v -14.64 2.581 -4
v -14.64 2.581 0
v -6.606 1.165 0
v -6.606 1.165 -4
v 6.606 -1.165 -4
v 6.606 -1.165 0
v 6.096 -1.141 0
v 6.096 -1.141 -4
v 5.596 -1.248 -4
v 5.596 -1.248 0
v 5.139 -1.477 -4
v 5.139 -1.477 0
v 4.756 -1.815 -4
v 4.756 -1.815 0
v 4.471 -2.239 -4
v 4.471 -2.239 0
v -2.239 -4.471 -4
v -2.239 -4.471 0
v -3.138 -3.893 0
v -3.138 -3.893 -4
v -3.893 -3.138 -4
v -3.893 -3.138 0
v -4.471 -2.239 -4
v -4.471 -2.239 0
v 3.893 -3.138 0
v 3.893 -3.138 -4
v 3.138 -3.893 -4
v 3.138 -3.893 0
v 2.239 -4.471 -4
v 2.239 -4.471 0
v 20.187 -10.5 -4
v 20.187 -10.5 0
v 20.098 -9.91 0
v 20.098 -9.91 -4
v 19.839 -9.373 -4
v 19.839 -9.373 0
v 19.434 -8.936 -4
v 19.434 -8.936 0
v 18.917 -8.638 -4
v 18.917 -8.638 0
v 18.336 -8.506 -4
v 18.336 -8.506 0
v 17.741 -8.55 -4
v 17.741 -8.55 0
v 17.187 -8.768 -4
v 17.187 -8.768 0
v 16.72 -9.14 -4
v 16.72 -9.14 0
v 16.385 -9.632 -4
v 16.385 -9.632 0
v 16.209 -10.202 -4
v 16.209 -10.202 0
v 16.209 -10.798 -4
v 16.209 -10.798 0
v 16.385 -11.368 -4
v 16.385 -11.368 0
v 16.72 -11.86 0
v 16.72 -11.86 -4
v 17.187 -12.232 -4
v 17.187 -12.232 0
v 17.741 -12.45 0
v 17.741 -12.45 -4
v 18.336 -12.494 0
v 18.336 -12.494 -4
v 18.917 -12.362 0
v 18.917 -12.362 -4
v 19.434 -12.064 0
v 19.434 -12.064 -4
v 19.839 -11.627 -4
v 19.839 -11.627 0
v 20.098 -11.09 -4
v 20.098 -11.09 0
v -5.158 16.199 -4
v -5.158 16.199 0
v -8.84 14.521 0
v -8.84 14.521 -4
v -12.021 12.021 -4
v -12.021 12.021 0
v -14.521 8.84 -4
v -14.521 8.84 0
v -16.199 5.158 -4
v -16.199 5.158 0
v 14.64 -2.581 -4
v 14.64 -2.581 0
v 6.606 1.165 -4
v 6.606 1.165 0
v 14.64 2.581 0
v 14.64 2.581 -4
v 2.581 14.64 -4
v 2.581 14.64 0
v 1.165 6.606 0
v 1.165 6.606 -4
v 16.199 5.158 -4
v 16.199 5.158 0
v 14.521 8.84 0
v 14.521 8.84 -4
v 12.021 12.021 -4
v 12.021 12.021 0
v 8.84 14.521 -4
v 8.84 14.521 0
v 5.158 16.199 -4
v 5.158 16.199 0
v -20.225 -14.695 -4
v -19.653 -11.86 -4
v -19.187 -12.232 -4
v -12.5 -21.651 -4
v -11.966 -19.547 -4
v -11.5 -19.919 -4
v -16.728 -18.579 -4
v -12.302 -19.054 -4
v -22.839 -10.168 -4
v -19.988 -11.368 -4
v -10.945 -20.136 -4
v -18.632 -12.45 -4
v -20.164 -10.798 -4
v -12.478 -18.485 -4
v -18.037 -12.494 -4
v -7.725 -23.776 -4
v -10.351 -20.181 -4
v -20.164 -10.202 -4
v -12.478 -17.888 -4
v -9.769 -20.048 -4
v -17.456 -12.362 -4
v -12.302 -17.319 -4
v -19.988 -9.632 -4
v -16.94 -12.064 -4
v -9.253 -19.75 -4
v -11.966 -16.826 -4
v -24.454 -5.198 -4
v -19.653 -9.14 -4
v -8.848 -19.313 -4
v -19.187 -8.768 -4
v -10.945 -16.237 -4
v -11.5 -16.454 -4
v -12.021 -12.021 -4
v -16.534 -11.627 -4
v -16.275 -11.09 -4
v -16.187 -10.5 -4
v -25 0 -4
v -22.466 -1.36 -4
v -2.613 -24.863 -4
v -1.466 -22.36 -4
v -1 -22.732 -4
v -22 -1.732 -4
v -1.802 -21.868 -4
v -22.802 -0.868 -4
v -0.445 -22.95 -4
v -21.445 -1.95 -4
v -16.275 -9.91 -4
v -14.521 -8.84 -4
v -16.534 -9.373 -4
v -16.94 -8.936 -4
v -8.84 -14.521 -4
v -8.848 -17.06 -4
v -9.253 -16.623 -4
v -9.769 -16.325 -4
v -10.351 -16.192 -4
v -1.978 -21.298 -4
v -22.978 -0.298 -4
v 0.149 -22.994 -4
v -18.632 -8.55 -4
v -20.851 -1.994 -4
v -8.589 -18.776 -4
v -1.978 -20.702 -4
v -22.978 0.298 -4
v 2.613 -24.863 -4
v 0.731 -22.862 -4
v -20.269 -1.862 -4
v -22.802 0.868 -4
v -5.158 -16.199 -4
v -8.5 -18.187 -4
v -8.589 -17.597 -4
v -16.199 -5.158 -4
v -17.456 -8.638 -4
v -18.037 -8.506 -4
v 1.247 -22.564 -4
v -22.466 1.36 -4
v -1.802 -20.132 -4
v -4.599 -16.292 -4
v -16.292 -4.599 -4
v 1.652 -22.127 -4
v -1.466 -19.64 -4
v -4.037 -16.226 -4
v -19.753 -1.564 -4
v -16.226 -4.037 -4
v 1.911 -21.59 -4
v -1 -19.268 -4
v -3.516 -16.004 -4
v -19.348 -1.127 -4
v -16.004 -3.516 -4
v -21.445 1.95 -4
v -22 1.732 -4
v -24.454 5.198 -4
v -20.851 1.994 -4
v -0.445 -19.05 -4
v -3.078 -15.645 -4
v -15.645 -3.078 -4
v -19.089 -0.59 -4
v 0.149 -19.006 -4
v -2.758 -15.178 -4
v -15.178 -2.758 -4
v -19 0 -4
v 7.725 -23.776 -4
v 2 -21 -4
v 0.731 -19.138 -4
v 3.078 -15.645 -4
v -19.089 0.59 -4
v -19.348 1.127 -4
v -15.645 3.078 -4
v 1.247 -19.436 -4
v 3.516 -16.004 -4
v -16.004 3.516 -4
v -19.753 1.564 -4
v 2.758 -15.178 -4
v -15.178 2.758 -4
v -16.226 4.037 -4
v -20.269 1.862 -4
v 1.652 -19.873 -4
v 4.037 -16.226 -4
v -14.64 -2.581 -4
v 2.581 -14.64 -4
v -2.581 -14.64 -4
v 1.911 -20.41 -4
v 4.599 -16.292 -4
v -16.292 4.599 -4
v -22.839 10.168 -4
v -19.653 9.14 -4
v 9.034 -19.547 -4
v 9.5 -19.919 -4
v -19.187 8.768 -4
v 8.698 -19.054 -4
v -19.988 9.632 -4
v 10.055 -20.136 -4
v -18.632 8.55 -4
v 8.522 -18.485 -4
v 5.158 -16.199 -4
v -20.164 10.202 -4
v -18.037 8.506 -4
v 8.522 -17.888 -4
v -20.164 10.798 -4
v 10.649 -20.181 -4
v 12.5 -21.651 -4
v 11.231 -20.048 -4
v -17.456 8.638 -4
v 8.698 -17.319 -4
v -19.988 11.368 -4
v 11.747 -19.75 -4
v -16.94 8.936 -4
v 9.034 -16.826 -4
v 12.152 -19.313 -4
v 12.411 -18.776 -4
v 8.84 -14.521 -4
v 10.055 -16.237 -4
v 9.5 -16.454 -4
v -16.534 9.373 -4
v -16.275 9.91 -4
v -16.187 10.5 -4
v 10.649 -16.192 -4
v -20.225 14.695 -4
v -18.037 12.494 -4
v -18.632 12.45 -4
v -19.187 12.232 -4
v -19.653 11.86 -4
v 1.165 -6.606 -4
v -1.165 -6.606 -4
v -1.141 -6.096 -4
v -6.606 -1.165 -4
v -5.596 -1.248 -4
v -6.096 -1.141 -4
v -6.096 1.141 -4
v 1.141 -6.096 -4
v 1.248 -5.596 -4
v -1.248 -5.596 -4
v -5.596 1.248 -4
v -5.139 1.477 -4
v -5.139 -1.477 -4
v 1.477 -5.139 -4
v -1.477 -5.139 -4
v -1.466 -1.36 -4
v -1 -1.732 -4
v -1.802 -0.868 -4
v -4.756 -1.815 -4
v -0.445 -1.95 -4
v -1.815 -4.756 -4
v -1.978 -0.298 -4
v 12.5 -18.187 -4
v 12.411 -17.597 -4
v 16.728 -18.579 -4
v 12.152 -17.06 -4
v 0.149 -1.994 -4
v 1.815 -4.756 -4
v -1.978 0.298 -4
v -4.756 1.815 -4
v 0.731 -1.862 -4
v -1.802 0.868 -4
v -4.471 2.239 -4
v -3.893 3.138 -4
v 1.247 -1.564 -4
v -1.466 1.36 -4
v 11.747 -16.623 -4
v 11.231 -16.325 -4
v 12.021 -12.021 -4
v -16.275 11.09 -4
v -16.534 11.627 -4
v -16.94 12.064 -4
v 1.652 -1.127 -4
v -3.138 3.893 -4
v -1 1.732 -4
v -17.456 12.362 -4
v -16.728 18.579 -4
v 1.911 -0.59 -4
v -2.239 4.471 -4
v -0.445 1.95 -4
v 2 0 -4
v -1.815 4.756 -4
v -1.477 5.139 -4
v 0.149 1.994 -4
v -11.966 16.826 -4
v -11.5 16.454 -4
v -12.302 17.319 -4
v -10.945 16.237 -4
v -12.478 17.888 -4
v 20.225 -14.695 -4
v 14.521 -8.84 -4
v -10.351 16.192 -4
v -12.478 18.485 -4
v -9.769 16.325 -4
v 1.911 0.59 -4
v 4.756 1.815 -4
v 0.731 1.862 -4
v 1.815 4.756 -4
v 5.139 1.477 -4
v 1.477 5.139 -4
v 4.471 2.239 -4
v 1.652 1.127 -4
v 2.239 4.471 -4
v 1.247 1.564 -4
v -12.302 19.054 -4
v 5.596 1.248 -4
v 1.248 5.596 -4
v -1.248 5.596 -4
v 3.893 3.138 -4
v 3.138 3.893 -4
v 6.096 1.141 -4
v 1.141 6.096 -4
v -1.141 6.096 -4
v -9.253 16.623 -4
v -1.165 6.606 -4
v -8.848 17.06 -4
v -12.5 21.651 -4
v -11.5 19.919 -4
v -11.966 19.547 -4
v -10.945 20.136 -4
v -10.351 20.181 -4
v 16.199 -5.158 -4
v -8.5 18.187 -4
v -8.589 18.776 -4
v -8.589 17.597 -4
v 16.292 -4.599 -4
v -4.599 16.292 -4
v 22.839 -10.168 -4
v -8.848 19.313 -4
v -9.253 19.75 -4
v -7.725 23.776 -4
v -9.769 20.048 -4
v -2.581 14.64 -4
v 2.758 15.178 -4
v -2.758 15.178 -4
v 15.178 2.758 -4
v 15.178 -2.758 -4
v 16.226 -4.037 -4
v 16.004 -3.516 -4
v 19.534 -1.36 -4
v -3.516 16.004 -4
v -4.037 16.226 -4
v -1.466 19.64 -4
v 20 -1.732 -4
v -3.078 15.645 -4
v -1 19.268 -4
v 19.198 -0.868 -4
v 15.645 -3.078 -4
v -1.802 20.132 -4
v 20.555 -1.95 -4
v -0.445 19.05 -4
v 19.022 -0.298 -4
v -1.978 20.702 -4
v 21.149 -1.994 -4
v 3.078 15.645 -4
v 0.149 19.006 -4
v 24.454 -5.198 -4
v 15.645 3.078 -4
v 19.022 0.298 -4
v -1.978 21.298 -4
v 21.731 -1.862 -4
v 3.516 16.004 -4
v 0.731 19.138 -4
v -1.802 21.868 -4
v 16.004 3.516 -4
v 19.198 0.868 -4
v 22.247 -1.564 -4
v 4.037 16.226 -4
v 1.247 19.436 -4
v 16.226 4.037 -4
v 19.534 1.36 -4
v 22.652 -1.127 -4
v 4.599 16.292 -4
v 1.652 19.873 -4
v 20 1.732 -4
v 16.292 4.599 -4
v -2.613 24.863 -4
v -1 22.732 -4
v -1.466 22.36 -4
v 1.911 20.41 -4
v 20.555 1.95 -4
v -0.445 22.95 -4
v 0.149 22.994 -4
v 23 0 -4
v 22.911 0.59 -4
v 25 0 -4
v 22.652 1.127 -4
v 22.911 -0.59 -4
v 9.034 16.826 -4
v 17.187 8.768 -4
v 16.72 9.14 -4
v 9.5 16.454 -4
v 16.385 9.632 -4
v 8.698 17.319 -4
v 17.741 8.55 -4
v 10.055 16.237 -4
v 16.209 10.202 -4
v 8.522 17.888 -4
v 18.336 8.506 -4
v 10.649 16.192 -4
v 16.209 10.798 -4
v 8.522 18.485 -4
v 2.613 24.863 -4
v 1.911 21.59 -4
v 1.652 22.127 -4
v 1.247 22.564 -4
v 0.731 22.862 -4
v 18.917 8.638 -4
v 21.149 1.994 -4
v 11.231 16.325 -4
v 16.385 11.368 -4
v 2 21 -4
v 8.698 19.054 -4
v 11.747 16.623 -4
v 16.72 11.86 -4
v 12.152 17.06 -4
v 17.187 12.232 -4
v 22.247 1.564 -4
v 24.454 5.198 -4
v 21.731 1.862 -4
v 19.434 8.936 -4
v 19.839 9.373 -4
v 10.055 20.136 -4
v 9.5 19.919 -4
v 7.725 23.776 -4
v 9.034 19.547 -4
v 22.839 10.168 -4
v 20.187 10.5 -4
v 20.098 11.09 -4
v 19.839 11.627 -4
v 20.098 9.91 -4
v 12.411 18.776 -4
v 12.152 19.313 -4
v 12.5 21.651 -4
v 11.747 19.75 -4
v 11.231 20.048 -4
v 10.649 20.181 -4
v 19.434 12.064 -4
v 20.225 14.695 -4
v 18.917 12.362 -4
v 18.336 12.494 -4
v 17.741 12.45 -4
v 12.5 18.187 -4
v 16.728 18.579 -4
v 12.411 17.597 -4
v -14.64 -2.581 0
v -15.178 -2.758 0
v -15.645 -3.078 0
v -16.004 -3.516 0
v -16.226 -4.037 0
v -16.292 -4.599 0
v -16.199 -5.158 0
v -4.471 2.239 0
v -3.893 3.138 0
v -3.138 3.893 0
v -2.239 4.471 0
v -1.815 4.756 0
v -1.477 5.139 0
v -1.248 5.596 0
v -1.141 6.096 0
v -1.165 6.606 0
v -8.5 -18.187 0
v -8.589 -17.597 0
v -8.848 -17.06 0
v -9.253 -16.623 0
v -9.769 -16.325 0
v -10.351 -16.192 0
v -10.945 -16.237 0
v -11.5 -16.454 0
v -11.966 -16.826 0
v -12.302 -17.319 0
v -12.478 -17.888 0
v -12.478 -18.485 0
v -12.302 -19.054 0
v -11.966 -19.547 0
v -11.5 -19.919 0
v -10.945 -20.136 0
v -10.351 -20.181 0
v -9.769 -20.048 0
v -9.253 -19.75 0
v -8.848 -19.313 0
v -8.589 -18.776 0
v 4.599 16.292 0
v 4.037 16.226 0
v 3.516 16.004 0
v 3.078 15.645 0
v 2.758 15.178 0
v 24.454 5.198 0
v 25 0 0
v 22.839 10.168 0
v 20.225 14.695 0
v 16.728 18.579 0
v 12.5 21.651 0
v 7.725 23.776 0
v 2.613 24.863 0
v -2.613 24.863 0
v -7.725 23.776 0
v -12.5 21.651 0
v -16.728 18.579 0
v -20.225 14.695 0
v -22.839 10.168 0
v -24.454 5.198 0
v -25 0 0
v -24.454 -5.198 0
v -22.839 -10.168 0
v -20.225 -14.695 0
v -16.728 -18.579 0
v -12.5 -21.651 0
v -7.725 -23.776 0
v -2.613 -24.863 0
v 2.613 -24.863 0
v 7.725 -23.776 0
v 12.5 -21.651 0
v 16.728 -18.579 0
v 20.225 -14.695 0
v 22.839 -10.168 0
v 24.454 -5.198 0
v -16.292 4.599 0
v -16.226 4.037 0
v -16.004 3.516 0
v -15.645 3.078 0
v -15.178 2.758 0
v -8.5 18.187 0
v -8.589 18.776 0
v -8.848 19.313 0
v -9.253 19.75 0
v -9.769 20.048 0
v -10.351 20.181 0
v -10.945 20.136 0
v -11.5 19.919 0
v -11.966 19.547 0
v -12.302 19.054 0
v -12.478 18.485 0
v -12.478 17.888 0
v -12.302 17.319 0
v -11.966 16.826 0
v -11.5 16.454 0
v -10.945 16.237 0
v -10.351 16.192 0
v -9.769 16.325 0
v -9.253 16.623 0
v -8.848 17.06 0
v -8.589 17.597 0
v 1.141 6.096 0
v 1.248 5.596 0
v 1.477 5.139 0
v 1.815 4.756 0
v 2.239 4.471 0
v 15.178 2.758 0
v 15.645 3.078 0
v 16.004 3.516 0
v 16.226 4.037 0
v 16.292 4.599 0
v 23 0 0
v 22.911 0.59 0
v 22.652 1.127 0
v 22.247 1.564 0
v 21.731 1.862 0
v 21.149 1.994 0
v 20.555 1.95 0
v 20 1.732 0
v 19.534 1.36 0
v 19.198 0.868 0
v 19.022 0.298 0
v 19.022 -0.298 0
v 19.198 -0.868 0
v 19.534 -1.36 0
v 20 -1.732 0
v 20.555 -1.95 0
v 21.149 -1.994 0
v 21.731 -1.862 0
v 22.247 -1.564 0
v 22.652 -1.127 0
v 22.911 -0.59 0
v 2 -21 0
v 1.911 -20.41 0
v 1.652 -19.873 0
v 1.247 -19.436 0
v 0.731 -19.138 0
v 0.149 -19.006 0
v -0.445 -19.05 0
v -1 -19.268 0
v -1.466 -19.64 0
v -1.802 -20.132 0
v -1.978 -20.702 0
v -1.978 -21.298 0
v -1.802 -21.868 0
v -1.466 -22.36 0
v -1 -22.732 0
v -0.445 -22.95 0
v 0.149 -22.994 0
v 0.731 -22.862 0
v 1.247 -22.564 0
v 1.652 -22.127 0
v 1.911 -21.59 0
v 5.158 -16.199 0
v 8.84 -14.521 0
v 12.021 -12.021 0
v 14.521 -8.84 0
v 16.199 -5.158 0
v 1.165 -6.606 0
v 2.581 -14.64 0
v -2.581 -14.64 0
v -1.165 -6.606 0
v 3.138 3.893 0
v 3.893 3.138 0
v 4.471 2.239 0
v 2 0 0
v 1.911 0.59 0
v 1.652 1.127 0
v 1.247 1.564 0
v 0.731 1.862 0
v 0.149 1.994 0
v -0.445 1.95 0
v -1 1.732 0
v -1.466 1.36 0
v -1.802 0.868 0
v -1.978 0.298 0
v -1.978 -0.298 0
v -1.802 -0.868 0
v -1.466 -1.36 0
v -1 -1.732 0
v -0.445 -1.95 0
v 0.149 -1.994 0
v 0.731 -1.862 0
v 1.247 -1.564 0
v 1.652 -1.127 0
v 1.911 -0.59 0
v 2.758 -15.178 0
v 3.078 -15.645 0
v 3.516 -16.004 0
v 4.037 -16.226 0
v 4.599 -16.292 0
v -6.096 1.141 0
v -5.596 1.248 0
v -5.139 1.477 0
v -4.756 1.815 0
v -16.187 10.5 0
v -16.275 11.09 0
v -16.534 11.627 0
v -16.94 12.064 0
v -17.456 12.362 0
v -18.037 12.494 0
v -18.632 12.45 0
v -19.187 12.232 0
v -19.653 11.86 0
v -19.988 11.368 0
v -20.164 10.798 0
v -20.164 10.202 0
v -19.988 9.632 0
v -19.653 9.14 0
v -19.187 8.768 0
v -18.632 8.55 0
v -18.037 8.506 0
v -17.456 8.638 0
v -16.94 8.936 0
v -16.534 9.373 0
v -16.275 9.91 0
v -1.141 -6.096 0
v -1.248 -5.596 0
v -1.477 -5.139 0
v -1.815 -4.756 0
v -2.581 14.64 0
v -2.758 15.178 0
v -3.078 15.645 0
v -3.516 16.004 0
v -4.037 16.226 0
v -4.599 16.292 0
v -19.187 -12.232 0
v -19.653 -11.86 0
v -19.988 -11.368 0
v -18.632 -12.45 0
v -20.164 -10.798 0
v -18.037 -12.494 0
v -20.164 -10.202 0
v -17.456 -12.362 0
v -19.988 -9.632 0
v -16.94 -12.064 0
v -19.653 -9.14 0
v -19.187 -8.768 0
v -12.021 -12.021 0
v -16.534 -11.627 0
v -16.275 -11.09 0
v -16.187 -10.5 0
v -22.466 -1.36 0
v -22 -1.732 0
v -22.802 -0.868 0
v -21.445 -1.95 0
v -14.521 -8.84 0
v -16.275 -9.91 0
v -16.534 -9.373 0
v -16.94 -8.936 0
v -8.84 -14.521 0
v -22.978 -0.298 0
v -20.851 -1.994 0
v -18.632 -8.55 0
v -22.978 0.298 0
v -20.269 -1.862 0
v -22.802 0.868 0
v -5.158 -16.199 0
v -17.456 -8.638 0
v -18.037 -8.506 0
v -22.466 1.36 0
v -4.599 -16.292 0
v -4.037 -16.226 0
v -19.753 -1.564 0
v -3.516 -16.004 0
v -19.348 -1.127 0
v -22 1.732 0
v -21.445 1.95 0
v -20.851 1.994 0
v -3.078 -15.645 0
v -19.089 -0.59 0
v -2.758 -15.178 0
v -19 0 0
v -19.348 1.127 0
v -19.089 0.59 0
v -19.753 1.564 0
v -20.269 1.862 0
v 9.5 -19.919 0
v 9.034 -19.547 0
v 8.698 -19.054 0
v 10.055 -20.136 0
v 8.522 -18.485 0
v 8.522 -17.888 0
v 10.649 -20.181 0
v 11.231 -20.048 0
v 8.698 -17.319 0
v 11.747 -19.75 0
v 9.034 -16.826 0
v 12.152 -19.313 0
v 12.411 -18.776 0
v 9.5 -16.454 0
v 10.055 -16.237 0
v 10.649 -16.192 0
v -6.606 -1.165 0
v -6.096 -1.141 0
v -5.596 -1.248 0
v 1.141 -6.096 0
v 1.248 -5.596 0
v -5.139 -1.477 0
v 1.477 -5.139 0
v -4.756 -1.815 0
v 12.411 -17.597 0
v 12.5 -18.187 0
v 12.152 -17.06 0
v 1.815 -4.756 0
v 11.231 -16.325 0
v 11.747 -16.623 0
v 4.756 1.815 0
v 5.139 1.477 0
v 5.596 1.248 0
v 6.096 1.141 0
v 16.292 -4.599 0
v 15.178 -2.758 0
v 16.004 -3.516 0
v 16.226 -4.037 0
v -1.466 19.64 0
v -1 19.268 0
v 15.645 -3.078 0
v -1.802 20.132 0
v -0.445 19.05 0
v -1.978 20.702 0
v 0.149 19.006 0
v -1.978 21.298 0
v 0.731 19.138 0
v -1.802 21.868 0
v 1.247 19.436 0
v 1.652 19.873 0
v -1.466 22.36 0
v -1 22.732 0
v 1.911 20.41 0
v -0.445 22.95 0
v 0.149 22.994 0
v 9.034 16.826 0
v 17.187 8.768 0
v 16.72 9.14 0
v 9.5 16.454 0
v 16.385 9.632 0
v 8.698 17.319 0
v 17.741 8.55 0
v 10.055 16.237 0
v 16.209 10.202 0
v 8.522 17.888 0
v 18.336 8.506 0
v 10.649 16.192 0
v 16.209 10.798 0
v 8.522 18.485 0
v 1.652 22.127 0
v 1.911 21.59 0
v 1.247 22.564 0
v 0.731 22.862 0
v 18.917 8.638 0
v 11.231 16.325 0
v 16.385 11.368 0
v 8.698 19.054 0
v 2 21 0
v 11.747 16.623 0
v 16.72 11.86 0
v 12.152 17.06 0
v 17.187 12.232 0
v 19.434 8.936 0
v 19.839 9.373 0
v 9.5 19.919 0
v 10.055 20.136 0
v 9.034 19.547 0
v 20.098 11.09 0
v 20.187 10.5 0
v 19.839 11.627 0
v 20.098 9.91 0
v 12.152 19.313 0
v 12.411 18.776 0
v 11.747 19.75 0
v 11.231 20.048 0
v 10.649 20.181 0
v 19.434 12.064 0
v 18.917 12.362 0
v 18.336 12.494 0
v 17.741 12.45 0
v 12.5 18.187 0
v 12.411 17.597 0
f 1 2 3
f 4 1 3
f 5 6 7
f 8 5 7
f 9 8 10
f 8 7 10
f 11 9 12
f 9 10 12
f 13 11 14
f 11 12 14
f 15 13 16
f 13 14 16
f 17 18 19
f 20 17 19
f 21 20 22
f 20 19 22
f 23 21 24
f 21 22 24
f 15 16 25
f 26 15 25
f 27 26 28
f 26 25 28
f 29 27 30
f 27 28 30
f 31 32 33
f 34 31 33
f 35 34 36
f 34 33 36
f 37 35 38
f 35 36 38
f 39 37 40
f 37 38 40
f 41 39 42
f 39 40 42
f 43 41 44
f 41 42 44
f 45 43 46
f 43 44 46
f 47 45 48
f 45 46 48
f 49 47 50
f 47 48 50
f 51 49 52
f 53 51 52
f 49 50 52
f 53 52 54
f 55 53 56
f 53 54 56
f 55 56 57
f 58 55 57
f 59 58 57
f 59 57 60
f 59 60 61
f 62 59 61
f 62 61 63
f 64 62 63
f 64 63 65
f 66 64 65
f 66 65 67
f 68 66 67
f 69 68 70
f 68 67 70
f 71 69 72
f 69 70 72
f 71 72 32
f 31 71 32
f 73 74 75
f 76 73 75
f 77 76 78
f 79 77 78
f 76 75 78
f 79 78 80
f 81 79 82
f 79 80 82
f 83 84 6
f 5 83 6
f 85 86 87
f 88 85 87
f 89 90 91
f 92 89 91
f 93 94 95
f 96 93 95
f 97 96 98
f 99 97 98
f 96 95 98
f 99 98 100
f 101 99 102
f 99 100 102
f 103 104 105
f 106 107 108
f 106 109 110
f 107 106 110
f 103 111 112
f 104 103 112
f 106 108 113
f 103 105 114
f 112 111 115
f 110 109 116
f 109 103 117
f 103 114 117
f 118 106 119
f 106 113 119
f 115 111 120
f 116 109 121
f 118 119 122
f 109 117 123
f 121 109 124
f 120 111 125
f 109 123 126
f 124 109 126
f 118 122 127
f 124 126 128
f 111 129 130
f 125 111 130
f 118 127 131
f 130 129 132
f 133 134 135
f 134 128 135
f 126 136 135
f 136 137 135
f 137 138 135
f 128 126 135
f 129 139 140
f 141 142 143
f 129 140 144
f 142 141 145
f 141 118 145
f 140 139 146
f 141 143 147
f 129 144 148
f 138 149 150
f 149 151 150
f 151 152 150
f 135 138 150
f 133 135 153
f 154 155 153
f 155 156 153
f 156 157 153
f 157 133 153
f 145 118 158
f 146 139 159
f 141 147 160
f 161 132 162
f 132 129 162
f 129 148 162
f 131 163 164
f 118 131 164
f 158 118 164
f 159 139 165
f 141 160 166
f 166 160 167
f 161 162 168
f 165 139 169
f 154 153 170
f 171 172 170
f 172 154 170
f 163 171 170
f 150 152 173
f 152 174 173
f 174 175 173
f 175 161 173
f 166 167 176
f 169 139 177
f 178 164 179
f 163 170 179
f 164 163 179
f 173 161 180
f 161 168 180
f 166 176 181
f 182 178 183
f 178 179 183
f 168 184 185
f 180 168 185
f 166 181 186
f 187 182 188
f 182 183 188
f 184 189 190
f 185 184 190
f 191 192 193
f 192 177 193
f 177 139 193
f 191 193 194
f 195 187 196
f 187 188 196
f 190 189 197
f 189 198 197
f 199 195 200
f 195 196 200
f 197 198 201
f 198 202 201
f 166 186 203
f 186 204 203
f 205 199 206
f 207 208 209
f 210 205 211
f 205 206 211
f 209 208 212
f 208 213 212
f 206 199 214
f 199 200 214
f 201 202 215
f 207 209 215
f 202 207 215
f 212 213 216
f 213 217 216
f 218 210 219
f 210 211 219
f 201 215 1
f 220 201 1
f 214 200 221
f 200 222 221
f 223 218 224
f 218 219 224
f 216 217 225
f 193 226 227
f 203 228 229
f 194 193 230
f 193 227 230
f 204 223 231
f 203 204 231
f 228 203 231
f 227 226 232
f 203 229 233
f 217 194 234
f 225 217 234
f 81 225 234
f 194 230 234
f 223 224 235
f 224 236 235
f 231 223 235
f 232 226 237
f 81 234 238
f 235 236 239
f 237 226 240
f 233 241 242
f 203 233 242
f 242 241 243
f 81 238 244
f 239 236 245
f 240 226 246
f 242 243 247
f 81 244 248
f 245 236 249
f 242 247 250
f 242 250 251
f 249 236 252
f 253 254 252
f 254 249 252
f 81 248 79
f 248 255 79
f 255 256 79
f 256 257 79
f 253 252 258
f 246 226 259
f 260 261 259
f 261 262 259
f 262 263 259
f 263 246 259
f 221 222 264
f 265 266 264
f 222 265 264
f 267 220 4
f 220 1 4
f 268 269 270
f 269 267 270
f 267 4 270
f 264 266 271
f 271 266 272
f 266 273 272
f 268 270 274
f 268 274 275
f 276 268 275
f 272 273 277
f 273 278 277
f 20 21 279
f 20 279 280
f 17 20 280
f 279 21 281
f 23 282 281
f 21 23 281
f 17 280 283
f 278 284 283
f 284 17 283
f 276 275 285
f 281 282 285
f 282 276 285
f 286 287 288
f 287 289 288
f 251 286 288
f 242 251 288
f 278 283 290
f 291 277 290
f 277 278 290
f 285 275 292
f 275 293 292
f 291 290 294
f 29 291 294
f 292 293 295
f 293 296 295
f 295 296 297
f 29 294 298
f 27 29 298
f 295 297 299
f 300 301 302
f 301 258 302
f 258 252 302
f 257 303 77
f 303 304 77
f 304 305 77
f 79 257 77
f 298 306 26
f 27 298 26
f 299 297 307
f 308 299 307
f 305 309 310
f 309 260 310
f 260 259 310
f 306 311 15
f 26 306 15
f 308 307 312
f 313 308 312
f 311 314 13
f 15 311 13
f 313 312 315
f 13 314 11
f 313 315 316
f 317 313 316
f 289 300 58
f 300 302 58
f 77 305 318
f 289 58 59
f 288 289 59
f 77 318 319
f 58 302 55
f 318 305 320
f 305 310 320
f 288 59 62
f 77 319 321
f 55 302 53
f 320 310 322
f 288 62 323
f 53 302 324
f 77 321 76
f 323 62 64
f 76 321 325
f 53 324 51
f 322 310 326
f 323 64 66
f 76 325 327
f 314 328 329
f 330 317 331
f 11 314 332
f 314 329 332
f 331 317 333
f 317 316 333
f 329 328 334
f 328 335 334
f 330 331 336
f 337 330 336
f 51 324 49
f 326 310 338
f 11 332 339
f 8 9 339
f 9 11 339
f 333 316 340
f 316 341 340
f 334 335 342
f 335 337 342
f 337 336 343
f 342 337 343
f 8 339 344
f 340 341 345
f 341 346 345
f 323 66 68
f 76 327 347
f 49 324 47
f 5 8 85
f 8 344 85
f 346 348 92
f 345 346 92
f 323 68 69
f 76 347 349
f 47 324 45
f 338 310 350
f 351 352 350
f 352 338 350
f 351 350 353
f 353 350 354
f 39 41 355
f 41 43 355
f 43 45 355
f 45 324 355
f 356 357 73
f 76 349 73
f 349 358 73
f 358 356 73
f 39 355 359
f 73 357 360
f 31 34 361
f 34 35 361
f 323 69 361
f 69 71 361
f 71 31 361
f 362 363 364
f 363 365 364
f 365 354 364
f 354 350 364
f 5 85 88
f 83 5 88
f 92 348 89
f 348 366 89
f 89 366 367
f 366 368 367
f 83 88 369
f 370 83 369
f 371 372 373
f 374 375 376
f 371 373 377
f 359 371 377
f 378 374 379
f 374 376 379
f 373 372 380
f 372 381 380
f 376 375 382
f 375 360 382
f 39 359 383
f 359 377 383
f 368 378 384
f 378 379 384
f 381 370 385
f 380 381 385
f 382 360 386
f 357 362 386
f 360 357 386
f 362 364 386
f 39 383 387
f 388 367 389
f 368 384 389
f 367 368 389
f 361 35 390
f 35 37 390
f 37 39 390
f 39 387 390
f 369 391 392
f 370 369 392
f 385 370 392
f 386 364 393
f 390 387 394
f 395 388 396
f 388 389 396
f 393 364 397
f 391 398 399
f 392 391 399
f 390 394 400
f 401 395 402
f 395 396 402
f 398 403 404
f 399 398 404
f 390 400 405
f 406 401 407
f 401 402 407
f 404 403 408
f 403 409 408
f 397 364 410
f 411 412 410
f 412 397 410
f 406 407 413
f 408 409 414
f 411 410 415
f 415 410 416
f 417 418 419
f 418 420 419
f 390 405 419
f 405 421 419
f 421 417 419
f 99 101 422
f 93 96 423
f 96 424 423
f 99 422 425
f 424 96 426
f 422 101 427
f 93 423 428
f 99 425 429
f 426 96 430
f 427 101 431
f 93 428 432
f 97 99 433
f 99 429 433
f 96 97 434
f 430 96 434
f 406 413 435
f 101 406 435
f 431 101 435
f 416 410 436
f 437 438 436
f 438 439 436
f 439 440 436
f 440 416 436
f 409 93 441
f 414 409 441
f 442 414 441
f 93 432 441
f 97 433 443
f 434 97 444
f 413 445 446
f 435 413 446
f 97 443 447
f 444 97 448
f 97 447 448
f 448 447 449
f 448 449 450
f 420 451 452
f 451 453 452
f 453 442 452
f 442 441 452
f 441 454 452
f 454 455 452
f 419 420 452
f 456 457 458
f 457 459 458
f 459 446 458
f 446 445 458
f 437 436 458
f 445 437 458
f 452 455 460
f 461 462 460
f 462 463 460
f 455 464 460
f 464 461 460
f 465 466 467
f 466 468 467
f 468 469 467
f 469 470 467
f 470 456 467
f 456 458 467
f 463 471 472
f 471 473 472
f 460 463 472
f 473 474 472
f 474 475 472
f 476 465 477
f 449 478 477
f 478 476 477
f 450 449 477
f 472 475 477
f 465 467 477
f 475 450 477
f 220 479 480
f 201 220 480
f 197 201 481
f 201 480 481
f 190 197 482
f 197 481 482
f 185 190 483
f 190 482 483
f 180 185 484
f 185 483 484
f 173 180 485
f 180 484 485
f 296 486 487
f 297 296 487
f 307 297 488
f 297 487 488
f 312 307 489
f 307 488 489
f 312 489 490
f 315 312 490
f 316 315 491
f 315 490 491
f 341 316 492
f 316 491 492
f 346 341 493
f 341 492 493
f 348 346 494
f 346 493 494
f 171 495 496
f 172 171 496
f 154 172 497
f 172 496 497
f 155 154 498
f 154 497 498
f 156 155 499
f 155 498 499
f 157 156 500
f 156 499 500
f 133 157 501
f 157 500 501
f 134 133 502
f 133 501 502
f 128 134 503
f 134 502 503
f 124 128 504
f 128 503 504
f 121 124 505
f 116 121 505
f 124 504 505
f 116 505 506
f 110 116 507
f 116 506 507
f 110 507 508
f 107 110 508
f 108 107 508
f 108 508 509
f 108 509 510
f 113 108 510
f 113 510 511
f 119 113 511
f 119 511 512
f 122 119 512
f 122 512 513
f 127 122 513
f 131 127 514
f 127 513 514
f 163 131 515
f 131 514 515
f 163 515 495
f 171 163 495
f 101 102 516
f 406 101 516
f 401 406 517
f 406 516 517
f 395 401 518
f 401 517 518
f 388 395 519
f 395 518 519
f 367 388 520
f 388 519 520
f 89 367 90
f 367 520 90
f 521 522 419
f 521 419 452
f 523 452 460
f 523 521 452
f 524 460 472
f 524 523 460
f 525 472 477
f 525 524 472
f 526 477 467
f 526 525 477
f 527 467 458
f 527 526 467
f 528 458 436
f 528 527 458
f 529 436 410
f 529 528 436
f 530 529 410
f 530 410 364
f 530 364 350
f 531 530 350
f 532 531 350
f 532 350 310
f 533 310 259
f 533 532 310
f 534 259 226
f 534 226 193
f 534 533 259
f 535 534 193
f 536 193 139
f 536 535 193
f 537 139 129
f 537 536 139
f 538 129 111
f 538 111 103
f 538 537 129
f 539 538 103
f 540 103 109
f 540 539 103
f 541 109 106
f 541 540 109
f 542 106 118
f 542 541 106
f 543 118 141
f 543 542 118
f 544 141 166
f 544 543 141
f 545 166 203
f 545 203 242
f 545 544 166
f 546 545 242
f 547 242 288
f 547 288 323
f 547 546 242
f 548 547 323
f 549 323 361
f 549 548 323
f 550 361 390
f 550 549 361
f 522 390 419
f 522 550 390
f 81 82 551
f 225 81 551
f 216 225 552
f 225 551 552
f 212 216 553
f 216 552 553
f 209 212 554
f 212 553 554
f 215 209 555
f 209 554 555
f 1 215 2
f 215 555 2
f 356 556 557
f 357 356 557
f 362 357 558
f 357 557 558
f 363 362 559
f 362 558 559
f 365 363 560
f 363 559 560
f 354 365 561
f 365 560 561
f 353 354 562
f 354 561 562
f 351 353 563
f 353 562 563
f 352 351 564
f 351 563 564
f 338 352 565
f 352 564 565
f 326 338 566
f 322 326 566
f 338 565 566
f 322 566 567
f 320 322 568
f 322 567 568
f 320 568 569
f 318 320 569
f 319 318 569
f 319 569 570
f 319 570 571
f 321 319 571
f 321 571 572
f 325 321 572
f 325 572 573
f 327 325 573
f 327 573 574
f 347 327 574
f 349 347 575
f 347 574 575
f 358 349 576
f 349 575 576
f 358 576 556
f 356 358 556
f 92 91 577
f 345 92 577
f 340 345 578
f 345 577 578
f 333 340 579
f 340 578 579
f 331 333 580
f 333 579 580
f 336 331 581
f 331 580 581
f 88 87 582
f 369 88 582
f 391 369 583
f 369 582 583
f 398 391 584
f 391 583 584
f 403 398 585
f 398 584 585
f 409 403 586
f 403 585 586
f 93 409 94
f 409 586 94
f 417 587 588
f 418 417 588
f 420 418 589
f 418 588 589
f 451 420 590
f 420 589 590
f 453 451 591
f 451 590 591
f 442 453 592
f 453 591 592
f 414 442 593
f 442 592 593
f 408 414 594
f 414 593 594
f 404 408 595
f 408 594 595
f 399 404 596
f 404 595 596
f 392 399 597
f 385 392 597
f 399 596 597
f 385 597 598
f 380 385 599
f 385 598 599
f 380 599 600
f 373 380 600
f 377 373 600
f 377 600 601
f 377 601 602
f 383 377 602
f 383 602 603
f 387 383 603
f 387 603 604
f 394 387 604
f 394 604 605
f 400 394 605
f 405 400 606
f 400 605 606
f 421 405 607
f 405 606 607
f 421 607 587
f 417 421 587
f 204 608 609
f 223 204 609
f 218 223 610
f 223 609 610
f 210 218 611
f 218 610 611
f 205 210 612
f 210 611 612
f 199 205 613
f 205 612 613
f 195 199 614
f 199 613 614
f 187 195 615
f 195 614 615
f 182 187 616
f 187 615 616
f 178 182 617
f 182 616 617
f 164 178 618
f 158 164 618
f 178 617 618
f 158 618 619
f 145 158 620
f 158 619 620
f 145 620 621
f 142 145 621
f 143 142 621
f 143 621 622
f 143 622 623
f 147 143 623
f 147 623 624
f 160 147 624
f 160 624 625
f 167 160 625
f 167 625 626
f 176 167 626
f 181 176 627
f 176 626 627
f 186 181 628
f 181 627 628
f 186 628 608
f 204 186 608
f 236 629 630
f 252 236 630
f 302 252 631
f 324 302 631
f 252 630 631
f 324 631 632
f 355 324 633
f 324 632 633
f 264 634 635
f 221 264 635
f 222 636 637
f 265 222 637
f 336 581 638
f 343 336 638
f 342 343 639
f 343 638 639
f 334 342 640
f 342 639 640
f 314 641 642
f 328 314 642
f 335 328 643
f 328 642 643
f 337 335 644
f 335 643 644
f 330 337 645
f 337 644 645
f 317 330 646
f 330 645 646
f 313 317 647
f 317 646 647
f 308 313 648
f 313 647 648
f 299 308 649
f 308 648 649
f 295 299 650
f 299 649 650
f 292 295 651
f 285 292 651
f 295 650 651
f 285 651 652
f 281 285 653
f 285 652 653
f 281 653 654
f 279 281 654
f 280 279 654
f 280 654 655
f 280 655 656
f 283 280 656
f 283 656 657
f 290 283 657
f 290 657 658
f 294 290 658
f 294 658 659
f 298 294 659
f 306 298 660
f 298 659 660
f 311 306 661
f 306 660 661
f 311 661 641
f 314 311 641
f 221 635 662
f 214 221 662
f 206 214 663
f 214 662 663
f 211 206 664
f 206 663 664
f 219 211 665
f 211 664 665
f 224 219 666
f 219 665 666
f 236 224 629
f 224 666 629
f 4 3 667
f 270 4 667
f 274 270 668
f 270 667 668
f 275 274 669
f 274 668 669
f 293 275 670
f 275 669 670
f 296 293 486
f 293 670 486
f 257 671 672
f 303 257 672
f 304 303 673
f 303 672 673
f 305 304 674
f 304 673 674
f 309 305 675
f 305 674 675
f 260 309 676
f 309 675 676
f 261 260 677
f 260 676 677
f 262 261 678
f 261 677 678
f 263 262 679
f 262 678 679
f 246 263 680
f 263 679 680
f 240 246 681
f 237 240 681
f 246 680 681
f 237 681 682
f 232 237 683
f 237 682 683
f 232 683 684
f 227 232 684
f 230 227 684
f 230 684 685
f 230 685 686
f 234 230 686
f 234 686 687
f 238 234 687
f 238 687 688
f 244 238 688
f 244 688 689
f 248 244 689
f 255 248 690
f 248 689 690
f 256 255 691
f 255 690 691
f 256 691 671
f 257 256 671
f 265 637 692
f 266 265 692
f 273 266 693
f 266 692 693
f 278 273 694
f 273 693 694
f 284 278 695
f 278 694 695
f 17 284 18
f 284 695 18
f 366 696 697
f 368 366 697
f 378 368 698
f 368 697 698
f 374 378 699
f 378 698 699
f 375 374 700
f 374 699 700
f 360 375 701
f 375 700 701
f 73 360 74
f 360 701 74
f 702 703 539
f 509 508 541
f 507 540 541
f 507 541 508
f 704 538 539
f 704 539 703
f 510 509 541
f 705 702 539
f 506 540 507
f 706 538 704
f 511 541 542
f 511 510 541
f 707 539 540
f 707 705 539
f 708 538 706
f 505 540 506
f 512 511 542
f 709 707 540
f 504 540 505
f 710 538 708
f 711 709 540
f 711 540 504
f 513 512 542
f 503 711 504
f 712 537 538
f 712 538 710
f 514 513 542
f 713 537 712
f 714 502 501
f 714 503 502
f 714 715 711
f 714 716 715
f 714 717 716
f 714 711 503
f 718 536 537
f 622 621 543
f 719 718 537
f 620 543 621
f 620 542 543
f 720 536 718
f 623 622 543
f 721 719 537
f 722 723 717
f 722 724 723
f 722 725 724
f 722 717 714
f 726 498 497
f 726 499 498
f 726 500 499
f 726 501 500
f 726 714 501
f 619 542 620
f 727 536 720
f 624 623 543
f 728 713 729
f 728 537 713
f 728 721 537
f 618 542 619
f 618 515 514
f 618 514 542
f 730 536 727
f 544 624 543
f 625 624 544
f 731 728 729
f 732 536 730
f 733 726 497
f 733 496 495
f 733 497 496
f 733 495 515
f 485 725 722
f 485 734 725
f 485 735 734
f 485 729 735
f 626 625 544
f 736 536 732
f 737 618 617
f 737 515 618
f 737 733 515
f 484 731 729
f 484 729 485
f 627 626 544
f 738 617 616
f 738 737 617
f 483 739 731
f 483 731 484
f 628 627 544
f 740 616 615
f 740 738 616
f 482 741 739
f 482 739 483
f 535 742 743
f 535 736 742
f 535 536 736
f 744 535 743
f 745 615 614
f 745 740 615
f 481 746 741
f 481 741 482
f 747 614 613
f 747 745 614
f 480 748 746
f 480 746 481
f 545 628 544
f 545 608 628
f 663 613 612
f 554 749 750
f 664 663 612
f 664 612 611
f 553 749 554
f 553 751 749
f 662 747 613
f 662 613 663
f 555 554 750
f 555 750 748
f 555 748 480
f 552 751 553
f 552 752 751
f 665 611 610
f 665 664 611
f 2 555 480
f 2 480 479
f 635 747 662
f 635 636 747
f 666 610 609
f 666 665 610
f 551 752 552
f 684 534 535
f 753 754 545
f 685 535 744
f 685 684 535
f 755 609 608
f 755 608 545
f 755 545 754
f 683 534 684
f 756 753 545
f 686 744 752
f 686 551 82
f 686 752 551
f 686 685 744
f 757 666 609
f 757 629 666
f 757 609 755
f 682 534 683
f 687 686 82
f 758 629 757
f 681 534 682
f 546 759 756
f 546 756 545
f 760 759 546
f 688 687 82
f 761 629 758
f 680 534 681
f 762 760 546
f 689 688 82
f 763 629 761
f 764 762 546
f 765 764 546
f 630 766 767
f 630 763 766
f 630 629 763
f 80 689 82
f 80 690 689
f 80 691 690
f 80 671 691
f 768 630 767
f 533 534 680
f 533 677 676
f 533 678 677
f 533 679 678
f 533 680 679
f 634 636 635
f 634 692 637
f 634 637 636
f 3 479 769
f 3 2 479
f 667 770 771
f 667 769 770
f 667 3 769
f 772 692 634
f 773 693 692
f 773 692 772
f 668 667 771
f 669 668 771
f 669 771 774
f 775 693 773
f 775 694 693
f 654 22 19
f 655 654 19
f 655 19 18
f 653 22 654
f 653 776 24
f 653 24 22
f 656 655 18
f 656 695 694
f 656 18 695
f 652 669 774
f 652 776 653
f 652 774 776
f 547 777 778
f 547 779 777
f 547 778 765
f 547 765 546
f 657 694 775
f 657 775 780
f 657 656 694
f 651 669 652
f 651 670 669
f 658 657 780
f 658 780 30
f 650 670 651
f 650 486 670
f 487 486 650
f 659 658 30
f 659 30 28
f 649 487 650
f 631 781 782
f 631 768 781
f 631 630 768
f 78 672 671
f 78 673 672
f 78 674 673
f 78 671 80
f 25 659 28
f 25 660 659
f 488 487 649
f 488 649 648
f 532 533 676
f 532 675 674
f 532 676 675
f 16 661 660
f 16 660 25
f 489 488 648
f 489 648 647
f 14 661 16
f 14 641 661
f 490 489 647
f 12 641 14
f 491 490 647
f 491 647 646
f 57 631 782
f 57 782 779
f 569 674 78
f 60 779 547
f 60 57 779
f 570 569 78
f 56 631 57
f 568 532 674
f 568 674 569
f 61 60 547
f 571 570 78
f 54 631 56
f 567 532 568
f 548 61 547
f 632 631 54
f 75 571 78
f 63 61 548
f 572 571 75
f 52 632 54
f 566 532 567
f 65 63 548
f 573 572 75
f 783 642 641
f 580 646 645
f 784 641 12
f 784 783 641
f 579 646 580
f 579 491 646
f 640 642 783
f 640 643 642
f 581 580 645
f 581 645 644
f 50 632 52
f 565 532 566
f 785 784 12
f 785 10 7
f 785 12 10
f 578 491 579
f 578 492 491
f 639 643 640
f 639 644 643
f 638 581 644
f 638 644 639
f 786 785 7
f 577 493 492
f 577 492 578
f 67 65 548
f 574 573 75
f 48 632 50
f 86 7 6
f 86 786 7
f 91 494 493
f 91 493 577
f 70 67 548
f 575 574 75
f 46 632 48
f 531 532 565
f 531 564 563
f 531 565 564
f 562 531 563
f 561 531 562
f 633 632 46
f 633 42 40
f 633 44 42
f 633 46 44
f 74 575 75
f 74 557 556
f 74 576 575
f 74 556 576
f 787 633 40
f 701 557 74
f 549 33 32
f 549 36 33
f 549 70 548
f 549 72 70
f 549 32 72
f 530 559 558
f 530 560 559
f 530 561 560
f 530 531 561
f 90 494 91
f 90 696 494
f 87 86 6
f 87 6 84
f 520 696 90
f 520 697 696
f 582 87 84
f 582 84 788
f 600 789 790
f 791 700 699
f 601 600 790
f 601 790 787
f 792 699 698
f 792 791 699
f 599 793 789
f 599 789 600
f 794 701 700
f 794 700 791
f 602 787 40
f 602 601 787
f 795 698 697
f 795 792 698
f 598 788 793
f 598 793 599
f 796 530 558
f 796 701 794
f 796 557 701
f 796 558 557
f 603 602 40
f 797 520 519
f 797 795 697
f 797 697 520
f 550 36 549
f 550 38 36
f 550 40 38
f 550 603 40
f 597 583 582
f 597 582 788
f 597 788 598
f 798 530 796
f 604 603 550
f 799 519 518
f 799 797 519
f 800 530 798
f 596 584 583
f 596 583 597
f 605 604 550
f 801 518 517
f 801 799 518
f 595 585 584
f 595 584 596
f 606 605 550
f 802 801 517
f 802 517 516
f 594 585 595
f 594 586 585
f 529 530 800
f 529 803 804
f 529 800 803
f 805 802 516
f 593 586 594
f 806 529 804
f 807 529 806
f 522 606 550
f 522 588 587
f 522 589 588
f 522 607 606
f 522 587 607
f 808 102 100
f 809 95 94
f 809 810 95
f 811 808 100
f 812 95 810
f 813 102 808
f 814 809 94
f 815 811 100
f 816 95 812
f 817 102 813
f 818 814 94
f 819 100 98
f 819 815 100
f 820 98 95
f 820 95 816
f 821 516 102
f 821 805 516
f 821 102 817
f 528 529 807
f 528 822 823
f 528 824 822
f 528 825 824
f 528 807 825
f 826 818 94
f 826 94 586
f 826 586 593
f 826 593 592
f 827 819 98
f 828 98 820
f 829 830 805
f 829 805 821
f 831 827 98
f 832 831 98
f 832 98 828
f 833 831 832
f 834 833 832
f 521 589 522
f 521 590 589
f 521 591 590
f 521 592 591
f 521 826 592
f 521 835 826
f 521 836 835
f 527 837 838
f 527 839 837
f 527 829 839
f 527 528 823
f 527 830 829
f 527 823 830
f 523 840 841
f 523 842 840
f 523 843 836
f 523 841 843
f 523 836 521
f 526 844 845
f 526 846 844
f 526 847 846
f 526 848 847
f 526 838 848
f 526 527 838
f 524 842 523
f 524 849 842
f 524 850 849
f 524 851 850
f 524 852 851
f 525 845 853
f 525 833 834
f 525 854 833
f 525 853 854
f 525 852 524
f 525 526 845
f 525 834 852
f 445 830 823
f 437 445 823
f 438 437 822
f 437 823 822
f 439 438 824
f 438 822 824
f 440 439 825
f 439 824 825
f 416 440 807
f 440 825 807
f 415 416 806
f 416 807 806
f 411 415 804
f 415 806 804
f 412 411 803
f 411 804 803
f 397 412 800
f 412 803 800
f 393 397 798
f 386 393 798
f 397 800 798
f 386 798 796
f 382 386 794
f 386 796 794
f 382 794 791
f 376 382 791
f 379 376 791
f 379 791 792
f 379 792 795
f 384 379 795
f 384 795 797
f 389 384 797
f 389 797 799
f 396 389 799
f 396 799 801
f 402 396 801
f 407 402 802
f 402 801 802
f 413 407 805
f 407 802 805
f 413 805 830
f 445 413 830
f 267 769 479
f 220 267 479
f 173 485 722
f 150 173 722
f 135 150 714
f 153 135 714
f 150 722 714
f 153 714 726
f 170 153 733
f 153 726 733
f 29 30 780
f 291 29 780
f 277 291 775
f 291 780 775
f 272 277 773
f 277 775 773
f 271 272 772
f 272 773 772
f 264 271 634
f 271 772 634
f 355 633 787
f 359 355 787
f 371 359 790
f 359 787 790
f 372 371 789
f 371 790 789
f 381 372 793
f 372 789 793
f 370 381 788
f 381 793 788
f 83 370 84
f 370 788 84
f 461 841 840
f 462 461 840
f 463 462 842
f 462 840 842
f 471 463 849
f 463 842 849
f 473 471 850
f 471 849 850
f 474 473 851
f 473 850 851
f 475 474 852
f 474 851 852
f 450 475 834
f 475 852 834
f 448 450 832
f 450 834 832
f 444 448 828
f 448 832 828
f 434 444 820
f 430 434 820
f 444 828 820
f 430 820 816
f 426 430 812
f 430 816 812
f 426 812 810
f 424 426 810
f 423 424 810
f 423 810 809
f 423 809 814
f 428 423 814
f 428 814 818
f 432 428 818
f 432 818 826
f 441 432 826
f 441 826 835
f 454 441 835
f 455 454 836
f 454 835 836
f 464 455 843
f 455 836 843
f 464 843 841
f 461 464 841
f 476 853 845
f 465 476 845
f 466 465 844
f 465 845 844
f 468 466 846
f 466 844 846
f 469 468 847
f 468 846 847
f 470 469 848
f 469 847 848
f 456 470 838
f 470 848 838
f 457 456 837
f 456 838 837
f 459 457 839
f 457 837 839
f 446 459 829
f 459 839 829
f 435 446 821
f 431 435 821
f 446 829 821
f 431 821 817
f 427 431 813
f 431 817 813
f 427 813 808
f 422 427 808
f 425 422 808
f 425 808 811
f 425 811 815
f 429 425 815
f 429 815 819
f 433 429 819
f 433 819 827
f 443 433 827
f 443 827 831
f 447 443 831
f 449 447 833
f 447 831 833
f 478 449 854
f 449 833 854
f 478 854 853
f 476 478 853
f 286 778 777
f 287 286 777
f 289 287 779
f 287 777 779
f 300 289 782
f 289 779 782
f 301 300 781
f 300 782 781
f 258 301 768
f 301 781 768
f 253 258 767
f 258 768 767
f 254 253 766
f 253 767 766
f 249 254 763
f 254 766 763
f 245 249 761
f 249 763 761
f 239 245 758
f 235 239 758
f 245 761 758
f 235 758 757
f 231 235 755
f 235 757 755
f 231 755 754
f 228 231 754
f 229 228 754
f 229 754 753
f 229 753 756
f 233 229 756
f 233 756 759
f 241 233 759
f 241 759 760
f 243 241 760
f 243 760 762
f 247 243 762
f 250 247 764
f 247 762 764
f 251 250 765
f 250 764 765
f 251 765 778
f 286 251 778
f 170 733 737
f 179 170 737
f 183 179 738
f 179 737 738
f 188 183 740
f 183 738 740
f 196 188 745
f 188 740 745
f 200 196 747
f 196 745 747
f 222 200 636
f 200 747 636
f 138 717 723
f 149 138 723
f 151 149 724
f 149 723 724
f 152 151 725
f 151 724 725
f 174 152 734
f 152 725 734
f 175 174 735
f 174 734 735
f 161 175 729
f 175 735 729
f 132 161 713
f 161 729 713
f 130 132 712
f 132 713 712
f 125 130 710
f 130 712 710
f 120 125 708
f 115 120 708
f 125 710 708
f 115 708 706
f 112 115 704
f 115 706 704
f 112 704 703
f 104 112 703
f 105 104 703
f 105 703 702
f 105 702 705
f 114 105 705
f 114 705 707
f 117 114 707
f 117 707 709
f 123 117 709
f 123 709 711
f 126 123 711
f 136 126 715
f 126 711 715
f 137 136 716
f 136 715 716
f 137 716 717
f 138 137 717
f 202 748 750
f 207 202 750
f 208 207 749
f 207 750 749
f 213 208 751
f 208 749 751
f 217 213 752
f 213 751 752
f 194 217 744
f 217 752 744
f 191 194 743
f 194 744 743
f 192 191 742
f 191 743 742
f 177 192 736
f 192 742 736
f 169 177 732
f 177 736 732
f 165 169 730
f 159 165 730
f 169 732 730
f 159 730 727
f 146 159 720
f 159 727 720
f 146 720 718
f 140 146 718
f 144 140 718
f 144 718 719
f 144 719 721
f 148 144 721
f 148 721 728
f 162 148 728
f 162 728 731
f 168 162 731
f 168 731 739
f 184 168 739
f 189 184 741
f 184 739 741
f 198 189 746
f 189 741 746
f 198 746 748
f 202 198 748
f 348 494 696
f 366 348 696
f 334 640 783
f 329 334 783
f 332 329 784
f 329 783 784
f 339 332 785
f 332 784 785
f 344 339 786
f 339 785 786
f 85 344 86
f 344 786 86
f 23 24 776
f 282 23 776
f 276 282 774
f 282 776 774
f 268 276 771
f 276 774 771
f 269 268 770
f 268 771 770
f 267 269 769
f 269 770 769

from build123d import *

# Parameters (mm, degrees)
F0_R     = 25
F0_R_2   = 2
F1_DEPTH = 4
F3_DEPTH = 25
F4_DEPTH = 25


# Not quite as in the source:
# - a feature names something its author has since deleted; it is built from what else it names


with BuildPart() as f1:
    # F0 (on Top) → F1 (new body)
    with BuildSketch(Plane.XY):
        Circle(F0_R)
        with Locations((-10.5, -18.1865334795)):
            Circle(F0_R_2, mode=Mode.SUBTRACT)
        with Locations((-18.1865334795, -10.5)):
            Circle(F0_R_2, mode=Mode.SUBTRACT)
        with Locations((0, -21)):
            Circle(F0_R_2, mode=Mode.SUBTRACT)
        with Locations((10.5, -18.1865334795)):
            Circle(F0_R_2, mode=Mode.SUBTRACT)
        with Locations((18.1865334795, -10.5)):
            Circle(F0_R_2, mode=Mode.SUBTRACT)
        with Locations((-21, 0)):
            Circle(F0_R_2, mode=Mode.SUBTRACT)
        with Locations((-18.1865334795, 10.5)):
            Circle(F0_R_2, mode=Mode.SUBTRACT)
        with Locations((-10.5, 18.1865334795)):
            Circle(F0_R_2, mode=Mode.SUBTRACT)
        Circle(F0_R_2, mode=Mode.SUBTRACT)
        with Locations((21, 0)):
            Circle(F0_R_2, mode=Mode.SUBTRACT)
        with Locations((18.1865334795, 10.5)):
            Circle(F0_R_2, mode=Mode.SUBTRACT)
        with Locations((10.5, 18.1865334795)):
            Circle(F0_R_2, mode=Mode.SUBTRACT)
        with Locations((0, 21)):
            Circle(F0_R_2, mode=Mode.SUBTRACT)
    extrude(amount=-F1_DEPTH)

    # F2 (on face) → F3 (cut)
    with BuildSketch(Plane.XY):
        with BuildLine():
            ThreePointArc((4.470710633, 2.2389163531), (5.3603810508, 1.3477279657), (6.6062912415, 1.1648673883))
            Line((6.6062912415, 1.1648673883), (14.6402197592, 2.581465747))
            ThreePointArc((14.6402197592, 2.581465747), (16.0042145423, 3.5159567971), (16.1986465243, 5.1578920868))
            ThreePointArc((16.1986465243, 5.1578920868), (12.0208152802, 12.0208152802), (5.1578920868, 16.1986465243))
            ThreePointArc((5.1578920868, 16.1986465243), (3.5159567971, 16.0042145423), (2.581465747, 14.6402197592))
            Line((2.581465747, 14.6402197592), (1.1648673883, 6.6062912415))
            ThreePointArc((1.1648673883, 6.6062912415), (1.3477279657, 5.3603810508), (2.2389163531, 4.470710633))
            ThreePointArc((2.2389163531, 4.470710633), (3.5355339059, 3.5355339059), (4.470710633, 2.2389163531))
        make_face()
        with BuildLine():
            ThreePointArc((-4.470710633, -2.2389163531), (-5.3603810508, -1.3477279657), (-6.6062912415, -1.1648673883))
            Line((-6.6062912415, -1.1648673883), (-14.6402197592, -2.581465747))
            ThreePointArc((-14.6402197592, -2.581465747), (-16.0042145423, -3.5159567971), (-16.1986465243, -5.1578920868))
            ThreePointArc((-16.1986465243, -5.1578920868), (-12.0208152802, -12.0208152802), (-5.1578920868, -16.1986465243))
            ThreePointArc((-5.1578920868, -16.1986465243), (-3.5159567971, -16.0042145423), (-2.581465747, -14.6402197592))
            Line((-2.581465747, -14.6402197592), (-1.1648673883, -6.6062912415))
            ThreePointArc((-1.1648673883, -6.6062912415), (-1.3477279657, -5.3603810508), (-2.2389163531, -4.470710633))
            ThreePointArc((-2.2389163531, -4.470710633), (-3.5355339059, -3.5355339059), (-4.470710633, -2.2389163531))
        make_face()
        with BuildLine():
            ThreePointArc((2.2389163531, -4.470710633), (1.3477279657, -5.3603810508), (1.1648673883, -6.6062912415))
            Line((1.1648673883, -6.6062912415), (2.581465747, -14.6402197592))
            ThreePointArc((2.581465747, -14.6402197592), (3.5159567971, -16.0042145423), (5.1578920868, -16.1986465243))
            ThreePointArc((5.1578920868, -16.1986465243), (12.0208152802, -12.0208152802), (16.1986465243, -5.1578920868))
            ThreePointArc((16.1986465243, -5.1578920868), (16.0042145423, -3.5159567971), (14.6402197592, -2.581465747))
            Line((14.6402197592, -2.581465747), (6.6062912415, -1.1648673883))
            ThreePointArc((6.6062912415, -1.1648673883), (5.3603810508, -1.3477279657), (4.470710633, -2.2389163531))
            ThreePointArc((4.470710633, -2.2389163531), (3.5355339059, -3.5355339059), (2.2389163531, -4.470710633))
        make_face()
    extrude(amount=-F3_DEPTH, mode=Mode.SUBTRACT)

    # F2 (on face) → F4 (cut)
    with BuildSketch(Plane.XY):
        with BuildLine():
            ThreePointArc((-2.581465747, 14.6402197592), (-3.5159567971, 16.0042145423), (-5.1578920868, 16.1986465243))
            ThreePointArc((-5.1578920868, 16.1986465243), (-12.0208152802, 12.0208152802), (-16.1986465243, 5.1578920868))
            ThreePointArc((-16.1986465243, 5.1578920868), (-16.0042145423, 3.5159567971), (-14.6402197592, 2.581465747))
            Line((-14.6402197592, 2.581465747), (-6.6062912415, 1.1648673883))
            ThreePointArc((-6.6062912415, 1.1648673883), (-5.3603810508, 1.3477279657), (-4.470710633, 2.2389163531))
            ThreePointArc((-4.470710633, 2.2389163531), (-3.5355339059, 3.5355339059), (-2.2389163531, 4.470710633))
            ThreePointArc((-2.2389163531, 4.470710633), (-1.3477279657, 5.3603810508), (-1.1648673883, 6.6062912415))
            Line((-1.1648673883, 6.6062912415), (-2.581465747, 14.6402197592))
        make_face()
    extrude(amount=-F4_DEPTH, mode=Mode.SUBTRACT)


solid = f1.part
